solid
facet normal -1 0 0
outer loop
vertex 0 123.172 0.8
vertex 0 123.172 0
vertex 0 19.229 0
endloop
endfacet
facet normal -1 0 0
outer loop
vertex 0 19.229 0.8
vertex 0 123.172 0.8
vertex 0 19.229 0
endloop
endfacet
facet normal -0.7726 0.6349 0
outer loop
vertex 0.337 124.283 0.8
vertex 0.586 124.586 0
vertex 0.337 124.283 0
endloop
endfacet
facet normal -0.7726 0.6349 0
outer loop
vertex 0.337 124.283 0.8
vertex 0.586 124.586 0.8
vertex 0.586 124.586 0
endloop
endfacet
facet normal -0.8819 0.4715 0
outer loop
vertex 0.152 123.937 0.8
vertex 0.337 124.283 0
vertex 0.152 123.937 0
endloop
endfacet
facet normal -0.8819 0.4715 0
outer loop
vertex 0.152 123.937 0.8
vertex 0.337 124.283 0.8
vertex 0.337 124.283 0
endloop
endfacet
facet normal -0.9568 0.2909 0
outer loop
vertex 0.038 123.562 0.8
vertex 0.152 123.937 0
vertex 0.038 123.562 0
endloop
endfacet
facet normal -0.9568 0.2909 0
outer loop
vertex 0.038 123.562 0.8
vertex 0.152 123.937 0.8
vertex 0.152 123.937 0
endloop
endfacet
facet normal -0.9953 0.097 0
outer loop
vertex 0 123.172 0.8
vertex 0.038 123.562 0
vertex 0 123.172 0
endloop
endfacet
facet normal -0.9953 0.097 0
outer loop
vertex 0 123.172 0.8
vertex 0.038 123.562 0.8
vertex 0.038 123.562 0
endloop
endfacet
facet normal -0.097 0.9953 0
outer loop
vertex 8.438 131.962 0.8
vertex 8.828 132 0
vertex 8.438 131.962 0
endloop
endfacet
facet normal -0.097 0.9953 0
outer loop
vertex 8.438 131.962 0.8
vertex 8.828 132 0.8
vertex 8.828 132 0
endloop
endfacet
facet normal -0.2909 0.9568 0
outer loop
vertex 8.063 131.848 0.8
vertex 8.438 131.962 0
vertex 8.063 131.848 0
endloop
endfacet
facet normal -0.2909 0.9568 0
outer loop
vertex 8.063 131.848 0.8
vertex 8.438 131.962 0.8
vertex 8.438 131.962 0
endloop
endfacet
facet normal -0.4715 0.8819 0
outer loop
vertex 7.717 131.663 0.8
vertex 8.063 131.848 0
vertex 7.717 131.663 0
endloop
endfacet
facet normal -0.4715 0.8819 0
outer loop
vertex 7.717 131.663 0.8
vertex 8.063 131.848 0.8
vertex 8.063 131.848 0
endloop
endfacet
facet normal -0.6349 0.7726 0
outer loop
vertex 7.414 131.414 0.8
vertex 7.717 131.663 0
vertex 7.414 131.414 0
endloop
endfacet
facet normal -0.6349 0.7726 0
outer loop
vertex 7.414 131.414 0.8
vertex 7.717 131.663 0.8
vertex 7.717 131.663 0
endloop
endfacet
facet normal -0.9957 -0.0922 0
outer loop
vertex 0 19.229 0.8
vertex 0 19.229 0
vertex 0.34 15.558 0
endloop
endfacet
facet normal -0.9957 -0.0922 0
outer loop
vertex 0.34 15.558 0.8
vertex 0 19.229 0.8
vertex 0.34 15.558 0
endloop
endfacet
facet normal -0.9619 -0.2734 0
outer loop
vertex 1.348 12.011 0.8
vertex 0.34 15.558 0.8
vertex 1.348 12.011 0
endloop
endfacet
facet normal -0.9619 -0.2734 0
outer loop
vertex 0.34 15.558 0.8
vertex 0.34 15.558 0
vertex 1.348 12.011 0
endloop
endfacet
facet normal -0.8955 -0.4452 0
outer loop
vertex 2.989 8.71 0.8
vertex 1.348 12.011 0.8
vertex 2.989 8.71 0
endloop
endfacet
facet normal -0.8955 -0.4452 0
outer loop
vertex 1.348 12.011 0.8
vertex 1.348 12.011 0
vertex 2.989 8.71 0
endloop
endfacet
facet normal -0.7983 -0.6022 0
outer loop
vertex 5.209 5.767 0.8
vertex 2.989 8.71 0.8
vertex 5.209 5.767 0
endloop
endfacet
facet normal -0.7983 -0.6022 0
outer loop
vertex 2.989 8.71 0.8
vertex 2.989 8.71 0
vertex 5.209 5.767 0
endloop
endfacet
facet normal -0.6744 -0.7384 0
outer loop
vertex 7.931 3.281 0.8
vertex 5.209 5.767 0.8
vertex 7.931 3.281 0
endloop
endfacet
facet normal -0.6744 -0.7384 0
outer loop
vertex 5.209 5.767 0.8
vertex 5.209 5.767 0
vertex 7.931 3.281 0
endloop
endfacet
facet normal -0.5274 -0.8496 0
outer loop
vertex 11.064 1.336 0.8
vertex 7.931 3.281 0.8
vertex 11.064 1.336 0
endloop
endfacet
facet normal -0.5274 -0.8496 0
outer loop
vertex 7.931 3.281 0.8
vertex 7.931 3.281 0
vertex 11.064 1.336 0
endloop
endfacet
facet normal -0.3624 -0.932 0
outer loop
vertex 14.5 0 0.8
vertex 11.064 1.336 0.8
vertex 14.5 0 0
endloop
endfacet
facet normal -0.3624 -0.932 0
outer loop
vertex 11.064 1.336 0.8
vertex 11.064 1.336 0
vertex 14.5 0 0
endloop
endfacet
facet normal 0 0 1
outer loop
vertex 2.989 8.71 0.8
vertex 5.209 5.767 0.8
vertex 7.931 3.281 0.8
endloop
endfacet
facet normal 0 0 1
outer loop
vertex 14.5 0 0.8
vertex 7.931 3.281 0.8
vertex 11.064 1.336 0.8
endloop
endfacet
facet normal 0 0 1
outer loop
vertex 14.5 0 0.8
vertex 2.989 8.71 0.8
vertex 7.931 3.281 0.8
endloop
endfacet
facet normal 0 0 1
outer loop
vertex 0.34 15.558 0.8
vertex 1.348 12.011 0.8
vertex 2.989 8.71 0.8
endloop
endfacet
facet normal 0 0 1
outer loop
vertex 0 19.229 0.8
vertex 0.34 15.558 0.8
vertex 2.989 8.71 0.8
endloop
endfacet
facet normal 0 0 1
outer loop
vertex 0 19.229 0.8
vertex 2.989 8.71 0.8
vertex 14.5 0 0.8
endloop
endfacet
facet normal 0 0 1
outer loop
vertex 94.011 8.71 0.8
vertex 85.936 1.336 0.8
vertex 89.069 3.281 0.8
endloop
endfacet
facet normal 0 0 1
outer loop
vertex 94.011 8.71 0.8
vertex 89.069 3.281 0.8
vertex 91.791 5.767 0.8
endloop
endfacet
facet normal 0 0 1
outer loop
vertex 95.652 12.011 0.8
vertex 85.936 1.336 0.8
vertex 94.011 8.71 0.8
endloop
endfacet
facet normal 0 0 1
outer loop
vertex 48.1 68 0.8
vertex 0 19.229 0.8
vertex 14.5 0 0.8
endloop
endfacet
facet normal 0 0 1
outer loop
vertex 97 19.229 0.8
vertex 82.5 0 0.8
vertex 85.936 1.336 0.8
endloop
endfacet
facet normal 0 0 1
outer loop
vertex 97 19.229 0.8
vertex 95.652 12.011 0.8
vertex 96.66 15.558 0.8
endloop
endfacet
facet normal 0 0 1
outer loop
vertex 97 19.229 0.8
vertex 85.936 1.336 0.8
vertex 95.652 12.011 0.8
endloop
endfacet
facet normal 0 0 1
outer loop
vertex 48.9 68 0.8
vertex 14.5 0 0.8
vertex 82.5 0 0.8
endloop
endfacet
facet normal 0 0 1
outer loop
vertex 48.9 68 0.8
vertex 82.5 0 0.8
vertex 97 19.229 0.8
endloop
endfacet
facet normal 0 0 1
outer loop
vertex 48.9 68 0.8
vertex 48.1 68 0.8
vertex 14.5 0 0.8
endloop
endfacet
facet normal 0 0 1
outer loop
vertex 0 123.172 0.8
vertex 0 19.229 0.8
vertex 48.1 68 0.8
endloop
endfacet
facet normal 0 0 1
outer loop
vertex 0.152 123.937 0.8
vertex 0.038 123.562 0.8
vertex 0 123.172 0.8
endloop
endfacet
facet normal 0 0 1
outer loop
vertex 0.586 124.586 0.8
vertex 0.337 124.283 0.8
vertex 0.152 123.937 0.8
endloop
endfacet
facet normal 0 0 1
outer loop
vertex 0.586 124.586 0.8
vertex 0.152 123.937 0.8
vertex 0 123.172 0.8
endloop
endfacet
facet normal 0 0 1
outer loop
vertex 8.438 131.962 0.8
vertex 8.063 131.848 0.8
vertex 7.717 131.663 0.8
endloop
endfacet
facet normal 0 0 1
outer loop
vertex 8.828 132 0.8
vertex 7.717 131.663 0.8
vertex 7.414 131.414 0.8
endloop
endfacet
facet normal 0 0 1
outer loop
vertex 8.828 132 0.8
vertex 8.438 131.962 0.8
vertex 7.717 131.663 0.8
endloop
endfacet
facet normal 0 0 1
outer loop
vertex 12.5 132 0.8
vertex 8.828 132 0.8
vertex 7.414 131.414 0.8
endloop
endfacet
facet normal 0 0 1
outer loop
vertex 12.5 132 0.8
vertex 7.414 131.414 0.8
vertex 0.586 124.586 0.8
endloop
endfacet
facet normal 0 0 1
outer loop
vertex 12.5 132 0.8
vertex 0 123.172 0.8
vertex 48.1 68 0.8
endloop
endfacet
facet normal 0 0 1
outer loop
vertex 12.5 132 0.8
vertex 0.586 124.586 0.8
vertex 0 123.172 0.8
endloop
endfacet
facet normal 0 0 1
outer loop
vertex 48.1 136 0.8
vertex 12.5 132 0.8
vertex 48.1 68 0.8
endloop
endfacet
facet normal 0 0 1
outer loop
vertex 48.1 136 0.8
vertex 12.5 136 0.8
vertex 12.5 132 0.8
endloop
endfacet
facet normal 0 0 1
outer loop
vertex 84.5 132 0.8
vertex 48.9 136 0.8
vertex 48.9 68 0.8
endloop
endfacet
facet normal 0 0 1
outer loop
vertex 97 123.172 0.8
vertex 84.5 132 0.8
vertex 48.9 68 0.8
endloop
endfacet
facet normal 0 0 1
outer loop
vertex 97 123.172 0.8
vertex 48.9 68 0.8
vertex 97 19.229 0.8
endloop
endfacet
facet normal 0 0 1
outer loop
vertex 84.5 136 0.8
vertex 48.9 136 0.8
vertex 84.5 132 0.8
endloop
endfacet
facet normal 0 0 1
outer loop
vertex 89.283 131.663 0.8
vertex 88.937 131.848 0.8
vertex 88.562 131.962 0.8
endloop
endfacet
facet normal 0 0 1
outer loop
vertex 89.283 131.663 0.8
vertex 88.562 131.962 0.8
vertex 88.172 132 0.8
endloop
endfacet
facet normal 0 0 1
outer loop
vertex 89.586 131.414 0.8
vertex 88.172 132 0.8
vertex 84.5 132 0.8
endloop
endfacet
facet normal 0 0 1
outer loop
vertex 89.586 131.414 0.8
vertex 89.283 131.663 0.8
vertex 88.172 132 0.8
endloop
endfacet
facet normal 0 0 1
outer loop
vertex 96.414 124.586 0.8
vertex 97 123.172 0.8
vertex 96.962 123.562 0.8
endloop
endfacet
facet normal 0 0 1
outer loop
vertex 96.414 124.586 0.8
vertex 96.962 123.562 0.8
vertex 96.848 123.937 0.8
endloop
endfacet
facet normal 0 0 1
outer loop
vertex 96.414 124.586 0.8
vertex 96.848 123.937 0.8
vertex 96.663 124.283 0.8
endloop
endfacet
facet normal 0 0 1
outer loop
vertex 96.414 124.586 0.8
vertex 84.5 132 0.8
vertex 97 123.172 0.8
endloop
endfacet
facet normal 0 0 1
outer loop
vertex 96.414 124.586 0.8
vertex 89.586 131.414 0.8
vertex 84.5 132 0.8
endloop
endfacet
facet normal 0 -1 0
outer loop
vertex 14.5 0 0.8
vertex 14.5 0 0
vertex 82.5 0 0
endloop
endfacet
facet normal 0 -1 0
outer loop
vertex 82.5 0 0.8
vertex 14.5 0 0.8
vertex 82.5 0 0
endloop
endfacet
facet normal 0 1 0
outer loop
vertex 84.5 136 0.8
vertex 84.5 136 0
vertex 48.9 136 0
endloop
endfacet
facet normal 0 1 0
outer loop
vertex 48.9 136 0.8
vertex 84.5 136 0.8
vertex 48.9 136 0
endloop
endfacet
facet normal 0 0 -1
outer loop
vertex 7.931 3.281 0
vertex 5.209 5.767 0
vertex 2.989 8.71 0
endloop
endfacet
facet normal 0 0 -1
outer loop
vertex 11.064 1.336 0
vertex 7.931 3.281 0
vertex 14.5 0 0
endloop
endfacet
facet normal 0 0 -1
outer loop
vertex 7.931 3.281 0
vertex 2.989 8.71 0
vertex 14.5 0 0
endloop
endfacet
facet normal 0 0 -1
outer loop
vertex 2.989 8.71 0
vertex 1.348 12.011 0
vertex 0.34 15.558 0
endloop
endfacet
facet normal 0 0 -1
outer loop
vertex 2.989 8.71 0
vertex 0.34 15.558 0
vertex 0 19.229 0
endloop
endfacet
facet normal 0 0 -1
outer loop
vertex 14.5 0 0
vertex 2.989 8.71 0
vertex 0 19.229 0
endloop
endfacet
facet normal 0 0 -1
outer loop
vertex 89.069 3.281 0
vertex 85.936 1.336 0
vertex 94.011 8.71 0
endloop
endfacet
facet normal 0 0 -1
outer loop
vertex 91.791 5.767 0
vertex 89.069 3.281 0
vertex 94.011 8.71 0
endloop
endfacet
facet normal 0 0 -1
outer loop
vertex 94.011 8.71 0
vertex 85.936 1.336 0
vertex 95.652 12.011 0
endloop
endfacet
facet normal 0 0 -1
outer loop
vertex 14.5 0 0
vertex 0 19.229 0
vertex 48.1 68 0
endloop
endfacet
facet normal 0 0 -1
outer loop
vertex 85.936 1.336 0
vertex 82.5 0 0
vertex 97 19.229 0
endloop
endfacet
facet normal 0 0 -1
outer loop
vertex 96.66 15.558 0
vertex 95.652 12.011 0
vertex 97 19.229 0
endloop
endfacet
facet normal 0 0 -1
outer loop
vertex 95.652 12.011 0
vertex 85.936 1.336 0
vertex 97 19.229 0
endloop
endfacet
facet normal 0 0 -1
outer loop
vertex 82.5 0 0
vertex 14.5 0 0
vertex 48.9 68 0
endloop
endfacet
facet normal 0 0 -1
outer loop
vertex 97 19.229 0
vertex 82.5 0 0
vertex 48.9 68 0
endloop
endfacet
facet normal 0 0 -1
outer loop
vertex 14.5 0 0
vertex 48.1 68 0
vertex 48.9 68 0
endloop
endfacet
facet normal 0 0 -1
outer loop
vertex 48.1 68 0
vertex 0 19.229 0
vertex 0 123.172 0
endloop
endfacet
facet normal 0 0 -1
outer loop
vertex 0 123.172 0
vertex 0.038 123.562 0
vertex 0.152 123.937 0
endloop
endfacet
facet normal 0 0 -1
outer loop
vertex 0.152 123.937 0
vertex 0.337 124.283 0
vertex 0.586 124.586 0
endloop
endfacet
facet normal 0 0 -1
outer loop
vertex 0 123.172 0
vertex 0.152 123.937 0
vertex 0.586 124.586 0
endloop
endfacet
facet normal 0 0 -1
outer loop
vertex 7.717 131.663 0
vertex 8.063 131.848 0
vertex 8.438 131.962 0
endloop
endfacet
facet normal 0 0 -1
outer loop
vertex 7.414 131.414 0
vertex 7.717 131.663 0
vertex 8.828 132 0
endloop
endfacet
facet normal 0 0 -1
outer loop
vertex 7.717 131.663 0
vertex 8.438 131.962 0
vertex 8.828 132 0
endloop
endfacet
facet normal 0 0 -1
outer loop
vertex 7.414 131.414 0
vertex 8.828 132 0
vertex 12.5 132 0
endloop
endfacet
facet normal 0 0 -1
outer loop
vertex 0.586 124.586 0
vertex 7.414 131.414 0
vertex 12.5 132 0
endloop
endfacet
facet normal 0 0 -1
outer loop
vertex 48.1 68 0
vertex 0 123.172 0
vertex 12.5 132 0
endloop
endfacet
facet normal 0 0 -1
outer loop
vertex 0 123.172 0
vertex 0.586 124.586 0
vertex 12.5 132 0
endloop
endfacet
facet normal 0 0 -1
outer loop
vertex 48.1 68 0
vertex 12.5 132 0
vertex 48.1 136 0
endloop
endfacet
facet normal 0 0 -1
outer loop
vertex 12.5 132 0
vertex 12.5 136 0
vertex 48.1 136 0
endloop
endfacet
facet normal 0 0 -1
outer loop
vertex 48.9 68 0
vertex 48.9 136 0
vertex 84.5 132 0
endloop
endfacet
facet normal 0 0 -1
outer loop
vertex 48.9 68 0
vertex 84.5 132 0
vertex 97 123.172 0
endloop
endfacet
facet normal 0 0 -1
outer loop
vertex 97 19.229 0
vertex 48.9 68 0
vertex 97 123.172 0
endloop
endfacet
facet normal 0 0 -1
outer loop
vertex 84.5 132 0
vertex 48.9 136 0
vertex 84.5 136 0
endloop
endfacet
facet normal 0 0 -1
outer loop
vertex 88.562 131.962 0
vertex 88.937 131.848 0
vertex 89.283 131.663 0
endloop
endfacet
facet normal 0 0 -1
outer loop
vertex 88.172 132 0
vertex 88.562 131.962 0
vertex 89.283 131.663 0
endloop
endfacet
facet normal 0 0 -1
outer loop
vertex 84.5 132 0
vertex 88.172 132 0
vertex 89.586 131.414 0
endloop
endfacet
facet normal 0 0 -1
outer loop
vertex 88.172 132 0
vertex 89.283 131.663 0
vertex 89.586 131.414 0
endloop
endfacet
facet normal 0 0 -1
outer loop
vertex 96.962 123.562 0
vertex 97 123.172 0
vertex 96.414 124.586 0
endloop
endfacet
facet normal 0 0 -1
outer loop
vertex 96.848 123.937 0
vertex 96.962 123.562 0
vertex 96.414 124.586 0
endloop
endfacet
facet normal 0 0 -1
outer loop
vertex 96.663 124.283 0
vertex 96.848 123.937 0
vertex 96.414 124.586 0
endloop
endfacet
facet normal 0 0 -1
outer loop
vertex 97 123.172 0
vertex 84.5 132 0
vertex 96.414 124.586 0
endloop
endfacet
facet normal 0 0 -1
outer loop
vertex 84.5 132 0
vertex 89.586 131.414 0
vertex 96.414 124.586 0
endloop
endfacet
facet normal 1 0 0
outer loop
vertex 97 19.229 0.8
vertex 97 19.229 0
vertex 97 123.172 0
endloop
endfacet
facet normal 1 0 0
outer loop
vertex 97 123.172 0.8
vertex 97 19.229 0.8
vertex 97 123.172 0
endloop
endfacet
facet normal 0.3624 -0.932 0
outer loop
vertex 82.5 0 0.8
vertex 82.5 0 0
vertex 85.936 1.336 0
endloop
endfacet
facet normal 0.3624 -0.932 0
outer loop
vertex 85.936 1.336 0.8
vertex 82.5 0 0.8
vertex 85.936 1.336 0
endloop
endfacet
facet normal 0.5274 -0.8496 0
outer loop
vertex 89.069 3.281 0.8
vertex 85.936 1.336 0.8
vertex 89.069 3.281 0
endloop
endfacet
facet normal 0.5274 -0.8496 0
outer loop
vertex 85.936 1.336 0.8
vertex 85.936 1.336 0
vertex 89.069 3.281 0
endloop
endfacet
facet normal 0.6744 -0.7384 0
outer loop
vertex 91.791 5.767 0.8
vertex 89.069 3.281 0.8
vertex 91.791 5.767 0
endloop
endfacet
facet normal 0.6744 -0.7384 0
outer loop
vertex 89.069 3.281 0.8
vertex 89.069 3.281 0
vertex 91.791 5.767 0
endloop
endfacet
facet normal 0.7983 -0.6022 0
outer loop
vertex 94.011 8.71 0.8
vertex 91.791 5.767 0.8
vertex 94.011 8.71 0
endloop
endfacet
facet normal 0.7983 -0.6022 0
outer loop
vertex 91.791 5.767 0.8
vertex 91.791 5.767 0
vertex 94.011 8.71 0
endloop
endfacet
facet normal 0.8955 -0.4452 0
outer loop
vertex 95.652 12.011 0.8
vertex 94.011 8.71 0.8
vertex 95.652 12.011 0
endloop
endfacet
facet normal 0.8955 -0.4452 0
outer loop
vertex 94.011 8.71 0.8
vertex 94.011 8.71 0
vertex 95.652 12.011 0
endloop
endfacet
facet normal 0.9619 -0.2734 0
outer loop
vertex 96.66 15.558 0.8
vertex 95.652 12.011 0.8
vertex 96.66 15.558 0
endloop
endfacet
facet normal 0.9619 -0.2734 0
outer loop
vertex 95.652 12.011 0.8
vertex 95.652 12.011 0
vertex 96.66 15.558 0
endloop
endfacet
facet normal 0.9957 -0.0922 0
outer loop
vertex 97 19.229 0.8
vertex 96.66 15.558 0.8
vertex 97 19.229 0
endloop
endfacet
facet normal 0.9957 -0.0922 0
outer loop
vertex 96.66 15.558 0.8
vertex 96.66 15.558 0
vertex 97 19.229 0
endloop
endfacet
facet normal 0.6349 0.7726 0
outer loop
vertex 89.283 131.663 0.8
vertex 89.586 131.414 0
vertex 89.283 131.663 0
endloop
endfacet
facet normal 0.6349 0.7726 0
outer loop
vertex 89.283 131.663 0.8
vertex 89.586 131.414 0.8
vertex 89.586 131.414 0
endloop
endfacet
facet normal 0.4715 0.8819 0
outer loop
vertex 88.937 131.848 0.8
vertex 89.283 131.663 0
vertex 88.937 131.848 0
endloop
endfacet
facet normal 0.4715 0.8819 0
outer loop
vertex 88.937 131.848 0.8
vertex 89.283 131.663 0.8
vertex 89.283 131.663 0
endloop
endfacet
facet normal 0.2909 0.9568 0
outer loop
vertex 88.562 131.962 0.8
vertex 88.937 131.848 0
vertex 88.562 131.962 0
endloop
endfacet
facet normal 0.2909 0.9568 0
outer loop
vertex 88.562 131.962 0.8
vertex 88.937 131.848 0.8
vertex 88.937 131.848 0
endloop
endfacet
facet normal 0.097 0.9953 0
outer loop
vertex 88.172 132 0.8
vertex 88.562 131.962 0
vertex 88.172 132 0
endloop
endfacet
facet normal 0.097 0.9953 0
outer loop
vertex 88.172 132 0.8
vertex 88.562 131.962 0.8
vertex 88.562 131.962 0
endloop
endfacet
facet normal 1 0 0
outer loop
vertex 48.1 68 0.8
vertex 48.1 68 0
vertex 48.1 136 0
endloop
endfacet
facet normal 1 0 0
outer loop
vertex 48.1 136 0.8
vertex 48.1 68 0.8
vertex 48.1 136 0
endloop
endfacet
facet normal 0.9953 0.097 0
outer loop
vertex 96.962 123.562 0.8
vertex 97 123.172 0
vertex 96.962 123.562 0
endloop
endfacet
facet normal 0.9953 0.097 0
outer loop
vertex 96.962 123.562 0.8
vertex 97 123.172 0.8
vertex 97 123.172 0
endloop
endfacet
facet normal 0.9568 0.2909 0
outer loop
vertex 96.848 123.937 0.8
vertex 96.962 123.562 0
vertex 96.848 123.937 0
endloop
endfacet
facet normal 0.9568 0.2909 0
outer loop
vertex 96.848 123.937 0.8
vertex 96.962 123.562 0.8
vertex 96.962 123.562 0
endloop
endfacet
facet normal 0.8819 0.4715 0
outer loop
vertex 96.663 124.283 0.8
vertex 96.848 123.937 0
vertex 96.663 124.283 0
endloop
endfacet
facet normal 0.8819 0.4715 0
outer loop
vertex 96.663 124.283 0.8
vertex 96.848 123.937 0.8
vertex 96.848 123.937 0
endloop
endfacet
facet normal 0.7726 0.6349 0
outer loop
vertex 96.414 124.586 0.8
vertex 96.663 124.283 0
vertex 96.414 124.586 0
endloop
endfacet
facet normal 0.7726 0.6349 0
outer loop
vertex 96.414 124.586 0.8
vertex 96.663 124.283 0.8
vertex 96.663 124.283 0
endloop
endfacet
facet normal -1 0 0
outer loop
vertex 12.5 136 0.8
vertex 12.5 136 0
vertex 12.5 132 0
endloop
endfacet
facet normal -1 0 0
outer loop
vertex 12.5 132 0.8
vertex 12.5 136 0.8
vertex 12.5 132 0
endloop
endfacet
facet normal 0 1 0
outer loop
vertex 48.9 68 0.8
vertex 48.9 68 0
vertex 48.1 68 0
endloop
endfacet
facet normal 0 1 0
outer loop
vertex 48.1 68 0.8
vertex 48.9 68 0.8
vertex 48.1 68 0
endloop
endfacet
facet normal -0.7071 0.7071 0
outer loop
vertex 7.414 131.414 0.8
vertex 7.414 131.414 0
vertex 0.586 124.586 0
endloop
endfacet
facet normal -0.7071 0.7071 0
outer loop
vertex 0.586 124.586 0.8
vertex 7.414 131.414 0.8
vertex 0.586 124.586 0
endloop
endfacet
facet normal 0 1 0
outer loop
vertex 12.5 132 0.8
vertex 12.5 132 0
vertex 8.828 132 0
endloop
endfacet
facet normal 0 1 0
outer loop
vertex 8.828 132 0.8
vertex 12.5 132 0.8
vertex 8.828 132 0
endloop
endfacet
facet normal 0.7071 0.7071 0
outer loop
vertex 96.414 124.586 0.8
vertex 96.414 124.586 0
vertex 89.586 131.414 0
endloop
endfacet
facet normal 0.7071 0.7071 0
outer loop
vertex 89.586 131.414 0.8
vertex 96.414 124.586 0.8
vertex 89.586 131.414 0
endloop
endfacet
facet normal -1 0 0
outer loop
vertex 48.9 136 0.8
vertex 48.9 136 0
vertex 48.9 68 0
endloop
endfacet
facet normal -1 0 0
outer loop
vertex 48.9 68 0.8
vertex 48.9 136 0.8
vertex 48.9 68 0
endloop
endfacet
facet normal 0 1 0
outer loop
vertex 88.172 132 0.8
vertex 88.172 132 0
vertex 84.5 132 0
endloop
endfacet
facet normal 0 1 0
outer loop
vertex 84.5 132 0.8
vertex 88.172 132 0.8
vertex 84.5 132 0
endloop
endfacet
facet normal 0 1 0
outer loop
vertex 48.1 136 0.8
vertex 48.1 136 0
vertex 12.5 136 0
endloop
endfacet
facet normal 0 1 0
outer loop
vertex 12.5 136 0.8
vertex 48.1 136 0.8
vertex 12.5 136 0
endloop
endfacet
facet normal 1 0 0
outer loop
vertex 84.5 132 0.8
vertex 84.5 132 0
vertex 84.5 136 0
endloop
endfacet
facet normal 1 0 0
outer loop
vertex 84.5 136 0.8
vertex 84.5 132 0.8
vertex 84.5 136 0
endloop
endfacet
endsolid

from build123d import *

# Parameters (mm, degrees)
BOSS_EXTRUDE1_DEPTH = 0.8
FILLET1_R           = 2


with BuildPart() as part:
    # Sketch1 → Boss-Extrude1 (new body)
    with BuildSketch(Plane.XY):
        with BuildLine():
            Line((14.5, 0), (82.5, 0))
            ThreePointArc((82.5, 0), (92.968719423, 7.187289944), (97, 19.228884523))
            Line((97, 19.228884523), (97, 124))
            Line((97, 124), (89, 132))
            Line((89, 132), (84.5, 132))
            Line((84.5, 132), (84.5, 136))
            Line((84.5, 136), (48.9, 136))
            Line((48.9, 136), (48.9, 68))
            Line((48.9, 68), (48.1, 68))
            Line((48.1, 68), (48.1, 136))
            Line((48.1, 136), (12.5, 136))
            Line((12.5, 136), (12.5, 132))
            Line((12.5, 132), (8, 132))
            Line((8, 132), (0, 124))
            Line((0, 124), (0, 19.228884523))
            ThreePointArc((0, 19.228884523), (4.031280577, 7.187289944), (14.5, 0))
        make_face()
    extrude(amount=BOSS_EXTRUDE1_DEPTH)

    # Fillet1
    fillet1_edges = [part.edges().sort_by_distance(p)[0] for p in [
        (89, 132, 0.4),
        (97, 124, 0.4),
        (0, 124, 0.4),
        (8, 132, 0.4),
    ]]
    fillet(fillet1_edges, radius=FILLET1_R)


solid = part.part
